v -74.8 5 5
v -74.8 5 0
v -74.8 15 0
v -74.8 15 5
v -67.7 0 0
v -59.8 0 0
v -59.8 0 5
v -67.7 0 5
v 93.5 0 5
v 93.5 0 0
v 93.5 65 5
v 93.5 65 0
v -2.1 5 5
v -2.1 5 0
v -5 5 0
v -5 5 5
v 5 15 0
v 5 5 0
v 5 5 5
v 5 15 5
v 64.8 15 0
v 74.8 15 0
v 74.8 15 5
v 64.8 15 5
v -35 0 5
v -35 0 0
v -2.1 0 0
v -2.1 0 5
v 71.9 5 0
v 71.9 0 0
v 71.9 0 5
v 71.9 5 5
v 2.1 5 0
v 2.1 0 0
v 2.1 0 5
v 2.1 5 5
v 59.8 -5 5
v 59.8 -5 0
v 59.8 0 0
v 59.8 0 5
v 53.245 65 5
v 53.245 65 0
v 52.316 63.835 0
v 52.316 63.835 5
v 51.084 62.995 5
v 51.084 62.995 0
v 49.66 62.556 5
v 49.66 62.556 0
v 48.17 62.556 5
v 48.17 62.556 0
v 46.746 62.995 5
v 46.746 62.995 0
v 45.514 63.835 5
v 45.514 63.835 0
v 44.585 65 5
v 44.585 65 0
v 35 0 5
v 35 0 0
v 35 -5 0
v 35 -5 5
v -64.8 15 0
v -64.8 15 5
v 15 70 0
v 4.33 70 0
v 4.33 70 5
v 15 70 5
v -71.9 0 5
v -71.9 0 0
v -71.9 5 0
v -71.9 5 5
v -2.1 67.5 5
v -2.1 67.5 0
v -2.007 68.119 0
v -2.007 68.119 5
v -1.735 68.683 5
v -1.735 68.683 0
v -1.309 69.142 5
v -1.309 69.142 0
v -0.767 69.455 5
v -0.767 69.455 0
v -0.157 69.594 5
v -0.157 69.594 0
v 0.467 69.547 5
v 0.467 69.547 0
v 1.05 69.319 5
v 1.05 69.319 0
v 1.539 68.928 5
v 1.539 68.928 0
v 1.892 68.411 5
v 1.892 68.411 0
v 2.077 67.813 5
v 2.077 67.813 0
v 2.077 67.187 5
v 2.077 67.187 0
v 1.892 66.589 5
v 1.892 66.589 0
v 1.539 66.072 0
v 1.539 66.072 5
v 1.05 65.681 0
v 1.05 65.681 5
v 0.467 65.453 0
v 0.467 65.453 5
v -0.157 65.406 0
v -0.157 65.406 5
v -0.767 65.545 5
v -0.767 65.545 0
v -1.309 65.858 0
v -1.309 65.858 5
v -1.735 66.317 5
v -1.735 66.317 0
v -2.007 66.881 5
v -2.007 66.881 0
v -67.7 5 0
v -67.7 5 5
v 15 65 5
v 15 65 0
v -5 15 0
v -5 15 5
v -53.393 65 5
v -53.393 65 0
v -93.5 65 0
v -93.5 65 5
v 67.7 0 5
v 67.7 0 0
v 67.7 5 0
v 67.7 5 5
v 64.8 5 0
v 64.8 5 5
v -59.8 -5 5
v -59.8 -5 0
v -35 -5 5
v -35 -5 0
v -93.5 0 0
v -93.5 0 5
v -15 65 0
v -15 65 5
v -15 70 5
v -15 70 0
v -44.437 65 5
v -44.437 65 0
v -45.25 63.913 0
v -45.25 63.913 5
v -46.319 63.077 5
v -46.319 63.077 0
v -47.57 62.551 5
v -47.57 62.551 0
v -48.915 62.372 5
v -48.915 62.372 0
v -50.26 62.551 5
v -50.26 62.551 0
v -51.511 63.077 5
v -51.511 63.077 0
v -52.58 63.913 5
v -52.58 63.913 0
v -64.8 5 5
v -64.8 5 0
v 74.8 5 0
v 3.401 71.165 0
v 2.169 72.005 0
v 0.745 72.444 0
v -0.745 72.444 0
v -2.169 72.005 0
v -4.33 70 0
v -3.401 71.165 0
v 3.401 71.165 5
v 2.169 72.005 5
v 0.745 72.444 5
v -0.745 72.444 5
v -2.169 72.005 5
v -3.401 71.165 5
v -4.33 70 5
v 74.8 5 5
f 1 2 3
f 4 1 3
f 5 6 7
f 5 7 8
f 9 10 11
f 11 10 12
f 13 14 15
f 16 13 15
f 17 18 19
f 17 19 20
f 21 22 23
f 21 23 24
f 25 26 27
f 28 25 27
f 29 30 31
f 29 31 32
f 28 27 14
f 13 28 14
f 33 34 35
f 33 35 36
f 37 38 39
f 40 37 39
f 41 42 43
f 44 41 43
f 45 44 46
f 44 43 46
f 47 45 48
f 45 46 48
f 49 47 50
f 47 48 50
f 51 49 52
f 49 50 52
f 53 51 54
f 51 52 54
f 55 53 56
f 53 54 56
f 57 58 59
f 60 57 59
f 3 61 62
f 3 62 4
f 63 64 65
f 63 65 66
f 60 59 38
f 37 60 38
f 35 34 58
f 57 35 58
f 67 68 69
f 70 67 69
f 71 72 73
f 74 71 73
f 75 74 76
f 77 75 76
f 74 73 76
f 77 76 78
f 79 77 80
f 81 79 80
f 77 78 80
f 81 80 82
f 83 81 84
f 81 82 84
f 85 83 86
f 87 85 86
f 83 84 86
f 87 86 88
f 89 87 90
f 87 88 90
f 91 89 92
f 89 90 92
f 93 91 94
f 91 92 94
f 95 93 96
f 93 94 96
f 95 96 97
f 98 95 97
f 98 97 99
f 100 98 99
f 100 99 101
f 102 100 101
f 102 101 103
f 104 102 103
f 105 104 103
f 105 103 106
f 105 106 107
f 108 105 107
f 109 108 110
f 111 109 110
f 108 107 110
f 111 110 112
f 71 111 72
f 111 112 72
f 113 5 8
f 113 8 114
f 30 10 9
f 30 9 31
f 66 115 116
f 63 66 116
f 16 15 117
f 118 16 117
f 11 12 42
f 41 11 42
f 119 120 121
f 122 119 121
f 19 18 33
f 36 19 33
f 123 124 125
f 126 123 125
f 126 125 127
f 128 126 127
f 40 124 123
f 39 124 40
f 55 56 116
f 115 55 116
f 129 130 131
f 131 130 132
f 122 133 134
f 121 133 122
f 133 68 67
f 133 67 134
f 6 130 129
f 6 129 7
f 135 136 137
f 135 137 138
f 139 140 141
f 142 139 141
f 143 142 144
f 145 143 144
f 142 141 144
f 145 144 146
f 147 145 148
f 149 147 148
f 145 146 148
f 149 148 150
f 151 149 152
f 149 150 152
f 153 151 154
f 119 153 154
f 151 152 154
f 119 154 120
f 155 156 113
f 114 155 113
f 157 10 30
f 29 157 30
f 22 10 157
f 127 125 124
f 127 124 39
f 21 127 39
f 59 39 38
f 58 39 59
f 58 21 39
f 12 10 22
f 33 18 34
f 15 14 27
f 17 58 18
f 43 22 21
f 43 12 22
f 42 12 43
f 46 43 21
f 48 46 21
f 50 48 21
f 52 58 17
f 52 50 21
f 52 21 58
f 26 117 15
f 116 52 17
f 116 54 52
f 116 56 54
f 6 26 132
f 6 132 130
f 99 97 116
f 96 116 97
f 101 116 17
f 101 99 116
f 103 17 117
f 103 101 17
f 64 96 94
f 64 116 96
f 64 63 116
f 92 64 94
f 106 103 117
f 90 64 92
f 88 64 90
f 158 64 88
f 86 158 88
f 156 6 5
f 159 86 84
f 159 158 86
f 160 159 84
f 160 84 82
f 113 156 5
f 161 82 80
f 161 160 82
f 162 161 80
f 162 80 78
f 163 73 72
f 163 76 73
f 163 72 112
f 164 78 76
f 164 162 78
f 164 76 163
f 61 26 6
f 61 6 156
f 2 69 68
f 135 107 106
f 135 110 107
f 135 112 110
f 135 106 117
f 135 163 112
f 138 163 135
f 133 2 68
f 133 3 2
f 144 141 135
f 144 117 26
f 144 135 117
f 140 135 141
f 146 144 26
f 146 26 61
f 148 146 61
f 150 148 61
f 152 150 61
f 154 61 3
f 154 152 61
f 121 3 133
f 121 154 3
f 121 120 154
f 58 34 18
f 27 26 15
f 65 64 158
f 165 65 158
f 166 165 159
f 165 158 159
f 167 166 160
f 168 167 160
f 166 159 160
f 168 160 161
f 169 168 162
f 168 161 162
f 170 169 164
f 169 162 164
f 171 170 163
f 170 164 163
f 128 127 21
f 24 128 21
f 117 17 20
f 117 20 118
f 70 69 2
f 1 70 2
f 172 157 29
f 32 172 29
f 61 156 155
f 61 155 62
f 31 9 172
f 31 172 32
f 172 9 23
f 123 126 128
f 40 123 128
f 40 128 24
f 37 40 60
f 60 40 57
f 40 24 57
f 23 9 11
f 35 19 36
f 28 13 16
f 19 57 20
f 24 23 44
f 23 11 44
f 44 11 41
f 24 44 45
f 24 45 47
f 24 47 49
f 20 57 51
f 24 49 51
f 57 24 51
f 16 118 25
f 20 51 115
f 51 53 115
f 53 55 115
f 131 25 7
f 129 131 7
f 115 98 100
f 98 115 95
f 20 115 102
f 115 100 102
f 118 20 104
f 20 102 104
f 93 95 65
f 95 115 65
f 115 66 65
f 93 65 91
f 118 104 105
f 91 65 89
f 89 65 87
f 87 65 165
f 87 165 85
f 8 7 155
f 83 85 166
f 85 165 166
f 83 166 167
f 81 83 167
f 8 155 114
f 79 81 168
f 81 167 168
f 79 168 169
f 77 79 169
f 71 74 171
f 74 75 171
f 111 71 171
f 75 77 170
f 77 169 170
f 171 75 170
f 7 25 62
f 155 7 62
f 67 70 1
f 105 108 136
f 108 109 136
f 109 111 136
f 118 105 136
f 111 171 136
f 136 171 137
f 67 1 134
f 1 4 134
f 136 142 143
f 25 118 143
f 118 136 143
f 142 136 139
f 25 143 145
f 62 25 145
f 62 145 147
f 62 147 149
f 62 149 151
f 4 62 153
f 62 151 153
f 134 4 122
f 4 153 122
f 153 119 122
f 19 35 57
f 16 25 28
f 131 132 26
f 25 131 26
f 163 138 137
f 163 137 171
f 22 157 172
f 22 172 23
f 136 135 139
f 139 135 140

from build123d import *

# Parameters (mm, degrees)
BOSS_EXTRUDE1_DEPTH = 5
SKETCH2_W           = 35
SKETCH2_H           = 65
CUT_EXTRUDE1_DEPTH  = 10
SKETCH4_W           = 30
SKETCH4_H           = 5
BOSS_EXTRUDE2_DEPTH = 5
SKETCH5_W           = 20
SKETCH5_H           = 5
CUT_EXTRUDE3_DEPTH  = 5
SKETCH6_R           = 2.1
CUT_EXTRUDE4_DEPTH  = 5
BOSS_EXTRUDE3_DEPTH = 5
SKETCH8_W           = 4.2
SKETCH8_H           = 5
SKETCH8_W_2         = 10
SKETCH8_H_2         = 10
CUT_EXTRUDE5_DEPTH  = 5
SKETCH10_W          = 30
SKETCH10_H          = 10
CUT_EXTRUDE7_DEPTH  = 6
SKETCH11_W          = 15
SKETCH11_H          = 5
SKETCH11_W_2        = 5.2
CUT_EXTRUDE8_DEPTH  = 6
SKETCH13_W          = 8.5
SKETCH13_H          = 65
BOSS_EXTRUDE5_DEPTH = 5
SKETCH14_R          = 5
SKETCH14_R_2        = 5.12829824
CUT_EXTRUDE9_DEPTH  = 5


with BuildPart() as part:
    # Sketch1 → Boss-Extrude1 (new body)
    with BuildSketch(Plane.XY):
        Polygon((95, -5), (95, 0), (115, 0), (115, 20), (120, 20), (120, 45), (115, 45), (115, 65), (100, 65), (100, 70), (70, 70), (70, 65), (-70, 65), (-70, 70), (-100, 70), (-100, 65), (-115, 65), (-115, 45), (-120, 45), (-120, 20), (-115, 20), (-115, 0), (-95, 0), (-95, -5), (-35, -5), (-35, 0), (35, 0), (35, -5), align=None)
    extrude(amount=BOSS_EXTRUDE1_DEPTH)

    # Sketch2 → Cut-Extrude1 (cut)
    with BuildSketch(Plane(origin=(0, 0, 0), x_dir=(-1, 0, 0), z_dir=(0, 0, -1))):
        with Locations((102.5, 27.5)):
            Rectangle(SKETCH2_W, SKETCH2_H)
        with Locations((-102.5, 27.5)):
            Rectangle(SKETCH2_W, SKETCH2_H)
    extrude(amount=-CUT_EXTRUDE1_DEPTH, mode=Mode.SUBTRACT)

    # Sketch4 → Boss-Extrude2 (add)
    with BuildSketch(Plane(origin=(0, 65, 0), x_dir=(1, 0, 0), z_dir=(0, 1, 0))):
        with Locations((0, -2.5)):
            Rectangle(SKETCH4_W, SKETCH4_H)
    extrude(amount=BOSS_EXTRUDE2_DEPTH)

    # Sketch5 → Cut-Extrude3 (cut)
    with BuildSketch(Plane(origin=(0, 0, 0), x_dir=(-1, 0, 0), z_dir=(0, 0, -1))):
        with Locations((-69.8, -2.5)):
            Rectangle(SKETCH5_W, SKETCH5_H)
        with Locations((69.8, -2.5)):
            Rectangle(SKETCH5_W, SKETCH5_H)
    extrude(amount=-CUT_EXTRUDE3_DEPTH, mode=Mode.SUBTRACT)

    # Sketch6 → Cut-Extrude4 (cut)
    with BuildSketch(Plane(origin=(0, 0, 0), x_dir=(-1, 0, 0), z_dir=(0, 0, -1))):
        with Locations((0, 67.5)):
            Circle(SKETCH6_R)
    extrude(amount=-CUT_EXTRUDE4_DEPTH, mode=Mode.SUBTRACT)

    # Sketch7 → Boss-Extrude3 (add)
    with BuildSketch(Plane(origin=(0, 0, 0), x_dir=(-1, 0, 0), z_dir=(0, 0, -1))):
        with BuildLine():
            Line((4.330127019, 70), (-4.330127019, 70))
            ThreePointArc((-4.330127019, 70), (0, 72.5), (4.330127019, 70))
        make_face()
    extrude(amount=-BOSS_EXTRUDE3_DEPTH)

    # Sketch8 → Cut-Extrude5 (cut)
    with BuildSketch(Plane(origin=(0, 0, 0), x_dir=(-1, 0, 0), z_dir=(0, 0, -1))):
        with Locations((69.8, 2.5)):
            Rectangle(SKETCH8_W, SKETCH8_H)
        with Locations((69.8, 10)):
            Rectangle(SKETCH8_W_2, SKETCH8_H_2)
        with Locations((-69.8, 10)):
            Rectangle(SKETCH8_W_2, SKETCH8_H_2)
        with Locations((-69.8, 2.5)):
            Rectangle(SKETCH8_W, SKETCH8_H)
        with Locations((0, 2.5)):
            Rectangle(SKETCH8_W, SKETCH8_H)
        with Locations((0, 10)):
            Rectangle(SKETCH8_W_2, SKETCH8_H_2)
    extrude(amount=-CUT_EXTRUDE5_DEPTH, mode=Mode.SUBTRACT)

    # Sketch10 → Cut-Extrude7 (cut, through all)
    with BuildSketch(Plane(origin=(0, 0, 0), x_dir=(-1, 0, 0), z_dir=(0, 0, -1))):
        with Locations((-100, 65)):
            Rectangle(SKETCH10_W, SKETCH10_H)
        with Locations((100, 65)):
            Rectangle(SKETCH10_W, SKETCH10_H)
    extrude(amount=-CUT_EXTRUDE7_DEPTH, mode=Mode.SUBTRACT)

    # Sketch11 → Cut-Extrude8 (cut, through all)
    with BuildSketch(Plane(origin=(0, 0, 0), x_dir=(-1, 0, 0), z_dir=(0, 0, -1))):
        with Locations((-77.5, 67.5)):
            Rectangle(SKETCH11_W, SKETCH11_H)
        with Locations((77.5, 67.5)):
            Rectangle(SKETCH11_W, SKETCH11_H)
        with Locations((82.4, -2.5)):
            Rectangle(SKETCH11_W_2, SKETCH11_H)
        with Locations((-82.4, -2.5)):
            Rectangle(SKETCH11_W_2, SKETCH11_H)
    extrude(amount=-CUT_EXTRUDE8_DEPTH, mode=Mode.SUBTRACT)

    # Sketch13 → Boss-Extrude5 (add)
    with BuildSketch(Plane(origin=(0, 0, 0), x_dir=(-1, 0, 0), z_dir=(0, 0, -1))):
        with Locations((-89.25, 32.5)):
            Rectangle(SKETCH13_W, SKETCH13_H)
        with Locations((89.25, 32.5)):
            Rectangle(SKETCH13_W, SKETCH13_H)
    extrude(amount=-BOSS_EXTRUDE5_DEPTH)

    # Sketch14 → Cut-Extrude9 (cut)
    with BuildSketch(Plane(origin=(0, 0, 0), x_dir=(-1, 0, 0), z_dir=(0, 0, -1))):
        with Locations((-48.915063509, 67.5)):
            Circle(SKETCH14_R)
        with Locations((48.915063509, 67.5)):
            Circle(SKETCH14_R_2)
    extrude(amount=-CUT_EXTRUDE9_DEPTH, mode=Mode.SUBTRACT)


solid = part.part
